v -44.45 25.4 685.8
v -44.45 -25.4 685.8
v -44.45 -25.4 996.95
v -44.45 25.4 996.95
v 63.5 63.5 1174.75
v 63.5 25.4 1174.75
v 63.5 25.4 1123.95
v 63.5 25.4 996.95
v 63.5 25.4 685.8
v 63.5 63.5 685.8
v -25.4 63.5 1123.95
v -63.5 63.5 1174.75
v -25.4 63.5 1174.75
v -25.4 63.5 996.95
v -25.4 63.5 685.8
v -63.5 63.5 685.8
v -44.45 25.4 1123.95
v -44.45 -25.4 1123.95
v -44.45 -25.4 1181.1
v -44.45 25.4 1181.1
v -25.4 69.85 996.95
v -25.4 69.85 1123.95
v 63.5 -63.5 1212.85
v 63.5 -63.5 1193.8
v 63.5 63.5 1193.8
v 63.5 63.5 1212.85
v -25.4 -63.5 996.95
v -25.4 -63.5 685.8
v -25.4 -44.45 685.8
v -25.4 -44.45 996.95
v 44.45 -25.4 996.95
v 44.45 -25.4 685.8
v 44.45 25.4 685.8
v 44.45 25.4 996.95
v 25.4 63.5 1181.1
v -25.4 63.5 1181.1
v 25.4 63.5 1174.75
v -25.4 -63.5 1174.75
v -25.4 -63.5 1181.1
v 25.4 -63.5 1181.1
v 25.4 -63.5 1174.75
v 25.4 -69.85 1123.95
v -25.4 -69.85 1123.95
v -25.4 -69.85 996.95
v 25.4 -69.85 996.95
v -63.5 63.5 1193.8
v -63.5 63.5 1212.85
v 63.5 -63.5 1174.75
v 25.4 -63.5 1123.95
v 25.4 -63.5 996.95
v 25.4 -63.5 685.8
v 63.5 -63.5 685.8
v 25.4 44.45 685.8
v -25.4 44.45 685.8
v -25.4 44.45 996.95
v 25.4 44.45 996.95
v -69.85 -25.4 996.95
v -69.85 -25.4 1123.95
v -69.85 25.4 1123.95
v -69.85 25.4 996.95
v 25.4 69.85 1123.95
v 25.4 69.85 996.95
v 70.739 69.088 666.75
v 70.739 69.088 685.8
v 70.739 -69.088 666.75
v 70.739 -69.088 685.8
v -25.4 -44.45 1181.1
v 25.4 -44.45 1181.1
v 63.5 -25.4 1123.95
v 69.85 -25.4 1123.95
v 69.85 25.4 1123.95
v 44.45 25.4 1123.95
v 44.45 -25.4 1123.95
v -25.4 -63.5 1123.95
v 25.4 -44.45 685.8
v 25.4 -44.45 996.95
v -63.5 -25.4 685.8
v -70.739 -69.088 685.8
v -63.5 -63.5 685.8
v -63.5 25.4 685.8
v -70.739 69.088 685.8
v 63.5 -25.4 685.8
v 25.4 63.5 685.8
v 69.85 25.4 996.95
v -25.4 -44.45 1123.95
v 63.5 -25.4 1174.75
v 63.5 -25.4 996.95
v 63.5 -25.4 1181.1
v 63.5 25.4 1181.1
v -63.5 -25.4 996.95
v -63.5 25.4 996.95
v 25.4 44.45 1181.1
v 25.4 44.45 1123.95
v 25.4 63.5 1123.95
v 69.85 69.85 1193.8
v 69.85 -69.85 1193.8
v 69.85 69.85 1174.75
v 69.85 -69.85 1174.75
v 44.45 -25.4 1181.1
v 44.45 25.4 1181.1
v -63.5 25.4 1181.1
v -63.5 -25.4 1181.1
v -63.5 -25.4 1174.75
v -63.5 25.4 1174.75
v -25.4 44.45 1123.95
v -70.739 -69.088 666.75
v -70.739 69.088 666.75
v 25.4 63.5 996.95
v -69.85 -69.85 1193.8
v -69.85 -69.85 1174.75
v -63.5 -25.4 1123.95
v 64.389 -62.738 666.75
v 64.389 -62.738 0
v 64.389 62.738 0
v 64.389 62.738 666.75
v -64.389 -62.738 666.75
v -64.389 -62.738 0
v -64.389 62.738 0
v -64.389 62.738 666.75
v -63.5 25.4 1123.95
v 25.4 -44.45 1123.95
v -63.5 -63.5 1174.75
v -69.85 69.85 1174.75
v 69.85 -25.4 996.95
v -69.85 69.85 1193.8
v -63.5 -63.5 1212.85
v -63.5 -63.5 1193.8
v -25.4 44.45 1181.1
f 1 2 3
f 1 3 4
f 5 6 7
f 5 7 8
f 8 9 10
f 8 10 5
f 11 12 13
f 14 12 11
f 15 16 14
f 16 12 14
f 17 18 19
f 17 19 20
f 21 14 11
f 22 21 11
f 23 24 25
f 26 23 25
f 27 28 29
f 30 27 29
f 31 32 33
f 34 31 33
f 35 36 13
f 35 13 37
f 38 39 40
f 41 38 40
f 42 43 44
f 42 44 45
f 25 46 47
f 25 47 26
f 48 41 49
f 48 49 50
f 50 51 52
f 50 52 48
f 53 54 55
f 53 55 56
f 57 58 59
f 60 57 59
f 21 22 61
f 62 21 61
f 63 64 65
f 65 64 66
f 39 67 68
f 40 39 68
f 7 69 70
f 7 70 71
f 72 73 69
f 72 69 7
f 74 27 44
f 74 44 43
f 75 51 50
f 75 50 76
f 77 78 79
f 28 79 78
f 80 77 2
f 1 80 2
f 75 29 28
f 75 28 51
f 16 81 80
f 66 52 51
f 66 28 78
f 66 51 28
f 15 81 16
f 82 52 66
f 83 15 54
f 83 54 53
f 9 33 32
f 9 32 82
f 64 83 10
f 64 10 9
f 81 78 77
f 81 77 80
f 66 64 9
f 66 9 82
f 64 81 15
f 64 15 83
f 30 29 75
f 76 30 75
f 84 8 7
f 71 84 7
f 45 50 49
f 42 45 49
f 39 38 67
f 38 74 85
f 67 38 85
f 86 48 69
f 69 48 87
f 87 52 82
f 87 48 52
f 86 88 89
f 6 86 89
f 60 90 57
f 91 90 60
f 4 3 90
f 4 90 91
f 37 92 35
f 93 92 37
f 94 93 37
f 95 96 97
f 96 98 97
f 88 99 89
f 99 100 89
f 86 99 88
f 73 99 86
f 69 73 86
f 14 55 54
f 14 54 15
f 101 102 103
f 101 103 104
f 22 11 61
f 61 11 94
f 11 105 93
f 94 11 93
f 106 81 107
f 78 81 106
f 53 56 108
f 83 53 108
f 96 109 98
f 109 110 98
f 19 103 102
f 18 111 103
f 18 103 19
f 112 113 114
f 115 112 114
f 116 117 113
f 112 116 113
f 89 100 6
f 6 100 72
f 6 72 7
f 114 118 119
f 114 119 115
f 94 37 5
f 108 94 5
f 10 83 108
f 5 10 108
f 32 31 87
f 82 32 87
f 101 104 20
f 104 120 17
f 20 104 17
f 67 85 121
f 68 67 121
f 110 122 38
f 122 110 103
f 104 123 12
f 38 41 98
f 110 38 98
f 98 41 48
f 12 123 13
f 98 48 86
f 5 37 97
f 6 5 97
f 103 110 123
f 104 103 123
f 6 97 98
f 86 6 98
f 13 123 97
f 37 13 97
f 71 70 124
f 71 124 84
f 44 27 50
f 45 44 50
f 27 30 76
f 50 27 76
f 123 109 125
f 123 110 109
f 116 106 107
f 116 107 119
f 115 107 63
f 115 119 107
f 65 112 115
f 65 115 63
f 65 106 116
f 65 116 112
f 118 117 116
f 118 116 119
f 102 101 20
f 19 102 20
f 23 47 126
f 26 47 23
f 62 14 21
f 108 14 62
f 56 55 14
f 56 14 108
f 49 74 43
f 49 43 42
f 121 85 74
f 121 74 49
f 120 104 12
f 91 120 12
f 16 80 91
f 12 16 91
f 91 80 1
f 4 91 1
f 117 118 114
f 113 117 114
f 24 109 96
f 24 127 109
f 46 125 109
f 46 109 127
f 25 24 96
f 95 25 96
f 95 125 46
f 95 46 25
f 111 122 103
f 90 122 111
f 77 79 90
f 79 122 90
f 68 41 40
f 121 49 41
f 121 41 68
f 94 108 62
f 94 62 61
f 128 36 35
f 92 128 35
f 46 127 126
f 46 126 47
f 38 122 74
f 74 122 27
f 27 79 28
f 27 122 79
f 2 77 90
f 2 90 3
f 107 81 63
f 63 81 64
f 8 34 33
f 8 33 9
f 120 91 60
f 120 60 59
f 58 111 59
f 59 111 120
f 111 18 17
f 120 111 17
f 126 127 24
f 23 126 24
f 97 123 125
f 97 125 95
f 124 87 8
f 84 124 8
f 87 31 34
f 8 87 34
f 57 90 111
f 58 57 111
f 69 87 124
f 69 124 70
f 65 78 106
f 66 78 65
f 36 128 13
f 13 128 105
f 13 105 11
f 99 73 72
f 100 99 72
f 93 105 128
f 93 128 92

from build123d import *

# Parameters (mm, degrees)
F0_W           = 128.778
F0_H           = 125.476
F1_DEPTH       = 673.1
F2_W           = 88.9
F2_H           = 88.9
F3_DEPTH       = 508
F4_W           = 141.477994
F4_H           = 138.175994
F4_W_2         = 88.9
F4_H_2         = 88.9
F5_DEPTH       = 12.7
F6_W           = 141.477994
F6_H           = 138.175994
F6_W_2         = 128.778
F6_H_2         = 125.476
F7_DEPTH       = 6.35
F8_W           = 38.1
F8_H           = 38.1
F9_DEPTH       = 495.3
F10_W          = 139.7
F10_H          = 139.7
F10_W_2        = 127
F10_H_2        = 127
F11_DEPTH      = 6.35
F12_W          = 139.7
F12_H          = 139.7
F13_DEPTH      = 12.7
F14_W          = 50.8
F14_H          = 127
F15_DEPTH      = 25.4
F15_DEPTH_BACK = 114.3
F16_W          = 50.8
F16_H          = 127
F17_DEPTH      = 25.4
F17_DEPTH_BACK = 114.3
F18_W          = 127
F18_H          = 127
F19_DEPTH      = 19.05


with BuildPart() as f1:
    # F0 (on Top) → F1 (new body)
    with BuildSketch(Plane.XY):
        Rectangle(F0_W, F0_H)
    extrude(amount=F1_DEPTH)

    # F2 (on face) → F3 (join)
    with BuildSketch(Plane.XY.offset(673.1)):
        Rectangle(F2_W, F2_H)
    extrude(amount=F3_DEPTH)

    # F4 (on face) → F5 (join)
    with BuildSketch(Plane.XY.offset(673.1)):
        Rectangle(F4_W, F4_H)
        Rectangle(F4_W_2, F4_H_2, mode=Mode.SUBTRACT)
    extrude(amount=F5_DEPTH)

    # F6 (on face) → F7 (join)
    with BuildSketch(Plane(origin=(0, 0, 673.1), x_dir=(1, 0, 0), z_dir=(0, 0, -1))):
        Rectangle(F6_W, F6_H)
        Rectangle(F6_W_2, F6_H_2, mode=Mode.SUBTRACT)
    extrude(amount=F7_DEPTH)

    # F8 (on face) → F9 (join)
    with BuildSketch(Plane.XY.offset(685.8)):
        with Locations((44.45, 44.45)):
            Rectangle(F8_W, F8_H)
        with Locations((44.45, -44.45)):
            Rectangle(F8_W, F8_H)
        with Locations((-44.45, -44.45)):
            Rectangle(F8_W, F8_H)
        with Locations((-44.45, 44.45)):
            Rectangle(F8_W, F8_H)
    extrude(amount=F9_DEPTH)

    # F10 (on face) → F11 (join)
    with BuildSketch(Plane.XY.offset(1181.1)):
        Rectangle(F10_W, F10_H)
        Rectangle(F10_W_2, F10_H_2, mode=Mode.SUBTRACT)
    extrude(amount=-F11_DEPTH)

    # F12 (on face) → F13 (join)
    with BuildSketch(Plane.XY.offset(1181.1)):
        Rectangle(F12_W, F12_H)
    extrude(amount=F13_DEPTH)

    # F14 (on face) → F15 (join, two sides)
    with BuildSketch(Plane.XZ.offset(44.45)) as f15_sk:
        with Locations((0, 1060.45)):
            Rectangle(F14_W, F14_H)
    extrude(amount=F15_DEPTH)
    extrude(f15_sk.sketch, amount=-F15_DEPTH_BACK)

    # F16 (on face) → F17 (join, two sides)
    with BuildSketch(Plane.YZ.offset(44.45)) as f17_sk:
        with Locations((0, 1060.45)):
            Rectangle(F16_W, F16_H)
    extrude(amount=F17_DEPTH)
    extrude(f17_sk.sketch, amount=-F17_DEPTH_BACK)

    # F18 (on face) → F19 (join)
    with BuildSketch(Plane.XY.offset(1193.8)):
        Rectangle(F18_W, F18_H)
    extrude(amount=F19_DEPTH)


solid = f1.part
